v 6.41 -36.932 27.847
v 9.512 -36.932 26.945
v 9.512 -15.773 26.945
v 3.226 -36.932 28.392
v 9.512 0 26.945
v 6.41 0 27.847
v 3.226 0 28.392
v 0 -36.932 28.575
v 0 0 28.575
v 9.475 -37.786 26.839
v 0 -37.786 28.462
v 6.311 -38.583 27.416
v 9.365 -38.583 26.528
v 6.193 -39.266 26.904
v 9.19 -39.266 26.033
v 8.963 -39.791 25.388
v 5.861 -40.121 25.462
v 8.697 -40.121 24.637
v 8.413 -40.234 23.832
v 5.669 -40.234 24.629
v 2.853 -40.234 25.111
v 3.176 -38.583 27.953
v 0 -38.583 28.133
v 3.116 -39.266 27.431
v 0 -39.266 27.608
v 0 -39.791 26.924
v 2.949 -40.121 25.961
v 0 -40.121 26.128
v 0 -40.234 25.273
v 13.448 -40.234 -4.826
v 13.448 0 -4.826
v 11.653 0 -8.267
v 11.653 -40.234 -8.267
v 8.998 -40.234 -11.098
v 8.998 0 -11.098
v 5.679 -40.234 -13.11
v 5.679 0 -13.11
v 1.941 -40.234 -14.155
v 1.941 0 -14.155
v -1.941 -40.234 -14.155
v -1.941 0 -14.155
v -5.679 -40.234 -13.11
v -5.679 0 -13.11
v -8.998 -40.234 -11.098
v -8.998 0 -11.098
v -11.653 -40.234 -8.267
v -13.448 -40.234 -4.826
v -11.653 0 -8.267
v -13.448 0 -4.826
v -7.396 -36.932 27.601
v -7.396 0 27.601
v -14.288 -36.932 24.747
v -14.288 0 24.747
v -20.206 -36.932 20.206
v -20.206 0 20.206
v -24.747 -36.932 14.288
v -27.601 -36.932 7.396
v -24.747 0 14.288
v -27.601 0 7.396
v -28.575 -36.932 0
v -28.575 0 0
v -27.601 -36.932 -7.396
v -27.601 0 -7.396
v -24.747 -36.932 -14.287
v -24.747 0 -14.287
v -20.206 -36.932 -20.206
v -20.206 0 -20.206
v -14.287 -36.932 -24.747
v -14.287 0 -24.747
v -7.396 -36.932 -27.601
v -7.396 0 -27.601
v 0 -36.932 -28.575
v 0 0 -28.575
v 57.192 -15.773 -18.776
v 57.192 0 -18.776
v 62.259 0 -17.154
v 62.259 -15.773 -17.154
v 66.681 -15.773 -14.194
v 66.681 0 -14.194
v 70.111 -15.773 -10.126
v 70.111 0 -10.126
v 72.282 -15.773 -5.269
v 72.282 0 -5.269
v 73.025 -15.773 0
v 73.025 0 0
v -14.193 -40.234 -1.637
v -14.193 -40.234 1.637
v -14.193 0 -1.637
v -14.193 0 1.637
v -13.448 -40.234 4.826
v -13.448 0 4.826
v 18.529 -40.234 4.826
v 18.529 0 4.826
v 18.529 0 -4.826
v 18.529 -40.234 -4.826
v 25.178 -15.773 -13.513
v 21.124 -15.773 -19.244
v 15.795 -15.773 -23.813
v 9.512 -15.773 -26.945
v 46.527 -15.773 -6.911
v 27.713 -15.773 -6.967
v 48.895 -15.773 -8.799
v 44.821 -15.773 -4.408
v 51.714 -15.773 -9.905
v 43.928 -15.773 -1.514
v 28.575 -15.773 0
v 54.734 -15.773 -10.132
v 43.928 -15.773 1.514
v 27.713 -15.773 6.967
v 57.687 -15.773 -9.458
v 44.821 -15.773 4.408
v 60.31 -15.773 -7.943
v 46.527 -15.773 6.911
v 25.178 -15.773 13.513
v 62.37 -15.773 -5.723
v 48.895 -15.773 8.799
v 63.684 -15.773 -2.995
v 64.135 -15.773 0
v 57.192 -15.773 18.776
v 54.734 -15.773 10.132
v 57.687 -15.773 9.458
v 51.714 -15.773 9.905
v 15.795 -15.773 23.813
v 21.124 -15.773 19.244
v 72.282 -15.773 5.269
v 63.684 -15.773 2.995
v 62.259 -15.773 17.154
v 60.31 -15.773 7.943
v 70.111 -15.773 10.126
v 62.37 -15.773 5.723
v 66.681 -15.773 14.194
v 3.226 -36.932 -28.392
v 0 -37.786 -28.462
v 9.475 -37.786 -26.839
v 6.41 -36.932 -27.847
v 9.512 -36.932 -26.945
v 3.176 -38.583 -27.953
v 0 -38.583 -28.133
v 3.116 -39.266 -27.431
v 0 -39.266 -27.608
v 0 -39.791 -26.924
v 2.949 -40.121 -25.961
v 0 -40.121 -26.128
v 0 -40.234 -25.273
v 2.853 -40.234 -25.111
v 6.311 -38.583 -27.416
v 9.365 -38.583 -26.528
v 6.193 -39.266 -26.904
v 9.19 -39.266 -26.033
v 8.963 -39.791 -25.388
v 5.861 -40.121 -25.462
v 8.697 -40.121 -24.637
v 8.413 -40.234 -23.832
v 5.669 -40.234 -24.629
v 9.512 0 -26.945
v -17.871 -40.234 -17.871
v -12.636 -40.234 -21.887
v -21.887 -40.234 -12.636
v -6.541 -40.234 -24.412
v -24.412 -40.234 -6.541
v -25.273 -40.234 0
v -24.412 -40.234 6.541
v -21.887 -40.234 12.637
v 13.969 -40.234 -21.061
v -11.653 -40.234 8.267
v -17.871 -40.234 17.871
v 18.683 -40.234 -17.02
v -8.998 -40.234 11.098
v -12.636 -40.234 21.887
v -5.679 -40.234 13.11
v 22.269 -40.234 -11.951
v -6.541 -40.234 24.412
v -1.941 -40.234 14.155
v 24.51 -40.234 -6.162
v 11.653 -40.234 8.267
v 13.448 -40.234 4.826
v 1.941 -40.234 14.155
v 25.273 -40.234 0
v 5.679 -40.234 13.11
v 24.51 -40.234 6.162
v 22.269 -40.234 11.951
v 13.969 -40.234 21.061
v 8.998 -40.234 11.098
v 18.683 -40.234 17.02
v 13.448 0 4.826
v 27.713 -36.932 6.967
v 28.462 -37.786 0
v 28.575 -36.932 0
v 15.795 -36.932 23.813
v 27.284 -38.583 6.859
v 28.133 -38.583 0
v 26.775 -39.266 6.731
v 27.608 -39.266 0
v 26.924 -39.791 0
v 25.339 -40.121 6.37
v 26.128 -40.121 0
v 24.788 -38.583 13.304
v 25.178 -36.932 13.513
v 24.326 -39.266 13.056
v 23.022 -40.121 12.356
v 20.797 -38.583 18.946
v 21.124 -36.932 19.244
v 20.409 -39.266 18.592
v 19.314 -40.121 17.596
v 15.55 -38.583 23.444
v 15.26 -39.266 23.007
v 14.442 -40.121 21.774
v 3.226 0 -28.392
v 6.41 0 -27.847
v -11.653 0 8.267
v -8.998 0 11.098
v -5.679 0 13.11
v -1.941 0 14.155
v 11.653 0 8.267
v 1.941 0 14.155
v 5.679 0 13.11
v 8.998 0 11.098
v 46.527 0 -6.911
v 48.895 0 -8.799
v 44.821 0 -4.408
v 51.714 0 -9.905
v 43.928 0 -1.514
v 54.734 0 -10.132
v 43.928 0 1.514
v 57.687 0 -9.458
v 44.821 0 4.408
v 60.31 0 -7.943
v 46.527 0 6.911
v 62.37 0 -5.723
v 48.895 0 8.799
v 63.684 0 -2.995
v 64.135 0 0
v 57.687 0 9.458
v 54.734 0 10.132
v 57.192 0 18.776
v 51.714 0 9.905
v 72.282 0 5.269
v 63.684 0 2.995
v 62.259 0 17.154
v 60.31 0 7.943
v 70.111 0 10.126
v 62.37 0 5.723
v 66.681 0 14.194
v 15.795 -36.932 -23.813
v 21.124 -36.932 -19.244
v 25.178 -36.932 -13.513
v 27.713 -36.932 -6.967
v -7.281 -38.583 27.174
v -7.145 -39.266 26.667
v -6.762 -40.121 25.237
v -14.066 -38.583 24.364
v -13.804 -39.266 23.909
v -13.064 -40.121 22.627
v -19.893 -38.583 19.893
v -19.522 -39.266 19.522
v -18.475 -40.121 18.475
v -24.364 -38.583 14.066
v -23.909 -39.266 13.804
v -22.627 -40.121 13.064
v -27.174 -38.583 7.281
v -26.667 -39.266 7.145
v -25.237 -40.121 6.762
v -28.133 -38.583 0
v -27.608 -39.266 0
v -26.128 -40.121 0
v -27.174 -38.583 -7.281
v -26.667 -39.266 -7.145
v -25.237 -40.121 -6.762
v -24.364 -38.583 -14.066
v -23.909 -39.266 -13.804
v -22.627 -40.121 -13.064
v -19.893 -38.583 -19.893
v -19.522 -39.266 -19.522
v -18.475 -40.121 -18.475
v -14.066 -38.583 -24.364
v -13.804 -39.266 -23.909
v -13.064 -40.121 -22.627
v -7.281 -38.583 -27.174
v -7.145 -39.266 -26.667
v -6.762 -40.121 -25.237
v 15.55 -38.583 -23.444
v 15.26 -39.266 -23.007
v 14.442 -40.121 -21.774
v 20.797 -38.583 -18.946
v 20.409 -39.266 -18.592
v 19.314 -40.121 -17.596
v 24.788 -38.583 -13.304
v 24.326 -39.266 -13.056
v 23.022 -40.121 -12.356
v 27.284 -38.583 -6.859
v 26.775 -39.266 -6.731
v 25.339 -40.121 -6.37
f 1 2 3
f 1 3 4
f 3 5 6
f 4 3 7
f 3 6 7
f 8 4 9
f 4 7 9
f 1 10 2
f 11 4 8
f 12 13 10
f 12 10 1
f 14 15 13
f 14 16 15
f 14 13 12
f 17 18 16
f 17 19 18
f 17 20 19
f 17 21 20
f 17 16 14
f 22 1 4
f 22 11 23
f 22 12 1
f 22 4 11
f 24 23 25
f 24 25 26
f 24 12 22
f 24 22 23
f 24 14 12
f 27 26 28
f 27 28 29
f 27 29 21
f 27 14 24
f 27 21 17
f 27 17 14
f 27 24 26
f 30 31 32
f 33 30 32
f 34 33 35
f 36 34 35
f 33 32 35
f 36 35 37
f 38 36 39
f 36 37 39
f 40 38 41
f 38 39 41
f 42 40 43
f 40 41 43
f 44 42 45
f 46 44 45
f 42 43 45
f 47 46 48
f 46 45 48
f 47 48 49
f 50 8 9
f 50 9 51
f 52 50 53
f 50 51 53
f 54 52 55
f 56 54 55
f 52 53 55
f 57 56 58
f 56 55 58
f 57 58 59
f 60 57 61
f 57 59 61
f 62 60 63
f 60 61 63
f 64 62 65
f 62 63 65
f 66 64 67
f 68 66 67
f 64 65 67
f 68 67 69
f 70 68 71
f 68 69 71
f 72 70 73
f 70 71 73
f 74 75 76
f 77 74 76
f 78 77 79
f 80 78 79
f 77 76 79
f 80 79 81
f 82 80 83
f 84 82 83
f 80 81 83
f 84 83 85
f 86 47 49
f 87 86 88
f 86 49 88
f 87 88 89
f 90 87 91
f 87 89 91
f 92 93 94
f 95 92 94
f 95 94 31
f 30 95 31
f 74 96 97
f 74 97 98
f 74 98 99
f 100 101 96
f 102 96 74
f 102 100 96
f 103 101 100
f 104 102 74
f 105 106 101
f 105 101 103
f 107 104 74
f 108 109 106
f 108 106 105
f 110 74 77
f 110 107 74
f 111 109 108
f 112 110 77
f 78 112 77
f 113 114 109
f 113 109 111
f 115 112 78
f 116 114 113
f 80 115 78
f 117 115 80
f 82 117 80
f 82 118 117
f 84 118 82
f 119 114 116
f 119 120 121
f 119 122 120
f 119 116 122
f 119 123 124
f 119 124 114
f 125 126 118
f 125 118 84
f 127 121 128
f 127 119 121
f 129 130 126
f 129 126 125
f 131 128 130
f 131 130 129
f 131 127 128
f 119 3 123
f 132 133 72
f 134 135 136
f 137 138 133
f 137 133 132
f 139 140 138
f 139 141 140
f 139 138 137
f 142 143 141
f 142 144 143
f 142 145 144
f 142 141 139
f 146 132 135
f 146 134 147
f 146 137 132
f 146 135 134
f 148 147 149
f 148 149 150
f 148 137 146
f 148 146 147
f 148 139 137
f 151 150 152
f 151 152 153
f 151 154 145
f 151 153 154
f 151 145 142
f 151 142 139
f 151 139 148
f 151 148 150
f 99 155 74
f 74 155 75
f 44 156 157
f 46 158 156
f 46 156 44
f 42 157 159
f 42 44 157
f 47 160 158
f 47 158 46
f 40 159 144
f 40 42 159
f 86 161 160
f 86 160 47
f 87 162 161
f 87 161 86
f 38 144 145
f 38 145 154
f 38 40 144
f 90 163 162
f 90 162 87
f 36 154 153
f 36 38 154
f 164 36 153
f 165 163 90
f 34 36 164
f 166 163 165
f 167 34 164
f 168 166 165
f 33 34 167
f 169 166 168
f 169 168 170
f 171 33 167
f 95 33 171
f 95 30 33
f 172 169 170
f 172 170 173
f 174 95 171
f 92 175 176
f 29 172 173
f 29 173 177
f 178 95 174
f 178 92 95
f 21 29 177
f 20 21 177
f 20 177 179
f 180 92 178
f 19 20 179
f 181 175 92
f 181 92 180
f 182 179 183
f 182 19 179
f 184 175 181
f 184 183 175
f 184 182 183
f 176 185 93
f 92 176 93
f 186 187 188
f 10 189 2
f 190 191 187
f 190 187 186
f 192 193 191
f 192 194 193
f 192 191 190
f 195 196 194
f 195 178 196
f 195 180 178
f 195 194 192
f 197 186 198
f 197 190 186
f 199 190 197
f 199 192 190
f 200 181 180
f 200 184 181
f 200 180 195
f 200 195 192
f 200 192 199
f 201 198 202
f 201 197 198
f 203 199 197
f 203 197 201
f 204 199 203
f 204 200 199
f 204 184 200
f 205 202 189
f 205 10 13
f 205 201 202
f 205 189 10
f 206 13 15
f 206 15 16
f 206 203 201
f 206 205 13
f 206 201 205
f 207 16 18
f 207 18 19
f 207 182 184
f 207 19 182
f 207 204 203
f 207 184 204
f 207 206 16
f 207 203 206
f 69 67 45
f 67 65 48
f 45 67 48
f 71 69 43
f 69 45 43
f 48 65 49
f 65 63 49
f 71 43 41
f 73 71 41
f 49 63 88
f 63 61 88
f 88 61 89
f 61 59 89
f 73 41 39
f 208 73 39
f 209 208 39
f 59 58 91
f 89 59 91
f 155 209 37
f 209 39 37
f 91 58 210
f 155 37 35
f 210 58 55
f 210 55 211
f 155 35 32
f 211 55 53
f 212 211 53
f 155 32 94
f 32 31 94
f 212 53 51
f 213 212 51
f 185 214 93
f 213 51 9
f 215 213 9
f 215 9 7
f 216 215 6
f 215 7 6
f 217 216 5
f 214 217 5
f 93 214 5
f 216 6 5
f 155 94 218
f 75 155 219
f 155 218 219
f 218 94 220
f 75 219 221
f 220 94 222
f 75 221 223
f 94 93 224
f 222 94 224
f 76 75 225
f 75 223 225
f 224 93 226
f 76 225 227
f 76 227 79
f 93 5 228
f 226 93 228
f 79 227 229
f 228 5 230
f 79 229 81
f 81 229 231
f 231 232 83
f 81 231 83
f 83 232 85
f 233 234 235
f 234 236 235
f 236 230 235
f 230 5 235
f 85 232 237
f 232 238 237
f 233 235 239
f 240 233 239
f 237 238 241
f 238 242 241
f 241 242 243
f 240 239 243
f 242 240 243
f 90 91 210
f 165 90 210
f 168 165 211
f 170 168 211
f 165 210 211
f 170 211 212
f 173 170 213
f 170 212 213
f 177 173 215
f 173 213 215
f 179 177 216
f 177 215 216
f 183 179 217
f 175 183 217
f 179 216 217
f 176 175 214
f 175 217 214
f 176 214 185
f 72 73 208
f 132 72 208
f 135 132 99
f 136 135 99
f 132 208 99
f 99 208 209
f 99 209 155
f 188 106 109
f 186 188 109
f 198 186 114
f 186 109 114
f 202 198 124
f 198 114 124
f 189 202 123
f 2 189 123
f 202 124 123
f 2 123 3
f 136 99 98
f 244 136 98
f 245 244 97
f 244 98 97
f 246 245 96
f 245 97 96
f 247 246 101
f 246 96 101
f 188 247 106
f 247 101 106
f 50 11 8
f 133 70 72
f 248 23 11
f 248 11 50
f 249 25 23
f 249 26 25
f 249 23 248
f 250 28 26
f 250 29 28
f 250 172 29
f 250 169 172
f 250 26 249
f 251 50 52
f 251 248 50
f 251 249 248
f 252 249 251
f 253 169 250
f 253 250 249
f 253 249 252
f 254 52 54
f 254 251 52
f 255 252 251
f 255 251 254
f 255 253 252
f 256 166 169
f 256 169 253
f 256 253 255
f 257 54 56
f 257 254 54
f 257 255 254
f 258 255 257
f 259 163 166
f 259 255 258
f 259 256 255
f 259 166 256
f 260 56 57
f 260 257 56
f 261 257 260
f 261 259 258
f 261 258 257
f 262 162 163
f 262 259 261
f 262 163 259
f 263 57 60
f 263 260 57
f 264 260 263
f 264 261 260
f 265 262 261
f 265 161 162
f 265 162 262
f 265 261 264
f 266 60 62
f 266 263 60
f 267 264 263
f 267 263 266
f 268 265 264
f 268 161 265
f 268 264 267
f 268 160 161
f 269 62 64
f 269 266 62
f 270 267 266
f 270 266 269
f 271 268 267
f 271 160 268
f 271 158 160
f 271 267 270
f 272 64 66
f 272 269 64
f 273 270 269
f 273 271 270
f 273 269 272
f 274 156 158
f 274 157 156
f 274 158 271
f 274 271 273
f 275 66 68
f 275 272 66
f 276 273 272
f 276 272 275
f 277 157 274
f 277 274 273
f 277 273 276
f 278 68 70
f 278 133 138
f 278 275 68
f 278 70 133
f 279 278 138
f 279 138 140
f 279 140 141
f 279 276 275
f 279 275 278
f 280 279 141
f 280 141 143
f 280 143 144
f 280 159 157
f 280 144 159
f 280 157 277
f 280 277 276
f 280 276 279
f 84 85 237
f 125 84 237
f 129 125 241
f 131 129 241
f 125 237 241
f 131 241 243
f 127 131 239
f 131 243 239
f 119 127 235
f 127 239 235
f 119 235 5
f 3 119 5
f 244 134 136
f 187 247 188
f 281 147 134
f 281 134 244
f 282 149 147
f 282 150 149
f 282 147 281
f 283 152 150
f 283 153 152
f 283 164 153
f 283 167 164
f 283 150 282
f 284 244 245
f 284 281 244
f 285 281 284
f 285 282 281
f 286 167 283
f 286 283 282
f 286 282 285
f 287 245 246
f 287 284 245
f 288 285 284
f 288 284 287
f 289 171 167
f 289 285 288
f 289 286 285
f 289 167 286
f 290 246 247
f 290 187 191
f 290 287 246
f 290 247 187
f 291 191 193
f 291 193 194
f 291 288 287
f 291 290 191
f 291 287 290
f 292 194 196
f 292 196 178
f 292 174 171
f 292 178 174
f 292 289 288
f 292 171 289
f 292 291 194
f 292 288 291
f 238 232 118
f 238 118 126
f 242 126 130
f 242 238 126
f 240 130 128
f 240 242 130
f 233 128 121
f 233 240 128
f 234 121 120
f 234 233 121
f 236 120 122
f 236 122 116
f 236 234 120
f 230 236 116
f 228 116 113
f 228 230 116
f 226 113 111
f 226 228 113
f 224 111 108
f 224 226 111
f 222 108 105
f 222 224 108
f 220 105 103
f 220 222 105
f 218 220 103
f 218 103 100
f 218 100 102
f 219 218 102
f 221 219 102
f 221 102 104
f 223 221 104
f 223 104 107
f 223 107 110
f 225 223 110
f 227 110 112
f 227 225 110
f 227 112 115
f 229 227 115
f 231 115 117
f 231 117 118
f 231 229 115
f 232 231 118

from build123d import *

# Parameters (mm, degrees)
F1_DEPTH = 40.2336
F0_R     = 10.16
F2_DEPTH = 15.7734
F3_R     = 3.302


with BuildPart() as f1:
    # F0 (on Front) → F1 (new body)
    with BuildSketch(Plane.XZ):
        with BuildLine():
            ThreePointArc((9.5121844836, 26.9452959039), (4.8253908933, 28.1646272428), (0, 28.575))
            Line((0, 28.575), (9.5121844836, 26.9452959039))
        make_face()
        with BuildLine():
            Line((9.5121844836, -26.9452959039), (0, -28.575))
            ThreePointArc((0, -28.575), (4.8253908933, -28.1646272428), (9.5121844836, -26.9452959039))
        make_face()
        with BuildLine():
            Line((9.5121844836, 26.9452959039), (0, 28.575))
            ThreePointArc((0, 28.575), (-28.575, 0), (0, -28.575))
            Line((0, -28.575), (9.5121844836, -26.9452959039))
            ThreePointArc((9.5121844836, -26.9452959039), (23.3274655355, -16.5033322905), (28.575, 0))
            ThreePointArc((28.575, 0), (23.3274655355, 16.5033322905), (9.5121844836, 26.9452959039))
        make_face()
        with BuildLine():
            ThreePointArc((-13.4477648793, 4.826), (0, 14.2875), (13.4477648793, 4.826))
            Line((13.4477648793, 4.826), (18.5293, 4.826))
            Line((18.5293, 4.826), (18.5293, -4.826))
            Line((18.5293, -4.826), (13.4477648793, -4.826))
            ThreePointArc((13.4477648793, -4.826), (0, -14.2875), (-13.4477648793, -4.826))
            Line((-13.4477648793, -4.826), (-18.5293, -4.826))
            Line((-18.5293, -4.826), (-18.5293, 4.826))
            Line((-18.5293, 4.826), (-13.4477648793, 4.826))
        make_face(mode=Mode.SUBTRACT)
        with BuildLine():
            ThreePointArc((-13.4477648793, -4.826), (-14.2875, 0), (-13.4477648793, 4.826))
            Line((-13.4477648793, 4.826), (-18.5293, 4.826))
            Line((-18.5293, 4.826), (-18.5293, -4.826))
            Line((-18.5293, -4.826), (-13.4477648793, -4.826))
        make_face()
    extrude(amount=F1_DEPTH)

    # F0 (on Front) → F2 (join)
    with BuildSketch(Plane.XZ):
        with BuildLine():
            Line((9.5121844836, 26.9452959039), (0, 28.575))
            ThreePointArc((0, 28.575), (-28.575, 0), (0, -28.575))
            Line((0, -28.575), (9.5121844836, -26.9452959039))
            ThreePointArc((9.5121844836, -26.9452959039), (23.3274655355, -16.5033322905), (28.575, 0))
            ThreePointArc((28.575, 0), (23.3274655355, 16.5033322905), (9.5121844836, 26.9452959039))
        make_face()
        with BuildLine():
            ThreePointArc((-13.4477648793, 4.826), (0, 14.2875), (13.4477648793, 4.826))
            Line((13.4477648793, 4.826), (18.5293, 4.826))
            Line((18.5293, 4.826), (18.5293, -4.826))
            Line((18.5293, -4.826), (13.4477648793, -4.826))
            ThreePointArc((13.4477648793, -4.826), (0, -14.2875), (-13.4477648793, -4.826))
            Line((-13.4477648793, -4.826), (-18.5293, -4.826))
            Line((-18.5293, -4.826), (-18.5293, 4.826))
            Line((-18.5293, 4.826), (-13.4477648793, 4.826))
        make_face(mode=Mode.SUBTRACT)
        with BuildLine():
            ThreePointArc((9.5121844836, 26.9452959039), (4.8253908933, 28.1646272428), (0, 28.575))
            Line((0, 28.575), (9.5121844836, 26.9452959039))
        make_face()
        with BuildLine():
            Line((9.5121844836, -26.9452959039), (0, -28.575))
            ThreePointArc((0, -28.575), (4.8253908933, -28.1646272428), (9.5121844836, -26.9452959039))
        make_face()
        with BuildLine():
            Line((57.1919272622, 18.7764181619), (9.5121844836, 26.9452959039))
            ThreePointArc((9.5121844836, 26.9452959039), (23.3274655355, 16.5033322905), (28.575, 0))
            ThreePointArc((28.575, 0), (23.3274655355, -16.5033322905), (9.5121844836, -26.9452959039))
            Line((9.5121844836, -26.9452959039), (57.1919272622, -18.7764181619))
            ThreePointArc((57.1919272622, -18.7764181619), (34.925, 0), (57.1919272622, 18.7764181619))
        make_face()
        with BuildLine():
            ThreePointArc((73.025, 0), (68.5383952831, 12.2804730295), (57.1919272622, 18.7764181619))
            ThreePointArc((57.1919272622, 18.7764181619), (34.925, 0), (57.1919272622, -18.7764181619))
            ThreePointArc((57.1919272622, -18.7764181619), (68.5383952831, -12.2804730295), (73.025, 0))
        make_face()
        with Locations((53.975, 0)):
            Circle(F0_R, mode=Mode.SUBTRACT)
    extrude(amount=F2_DEPTH)

    # F3
    f3_edges = [f1.edges().sort_by_distance(p)[0] for p in [
        (0, -40.2336, -28.575),
    ]]
    fillet(f3_edges, radius=F3_R)


solid = f1.part
